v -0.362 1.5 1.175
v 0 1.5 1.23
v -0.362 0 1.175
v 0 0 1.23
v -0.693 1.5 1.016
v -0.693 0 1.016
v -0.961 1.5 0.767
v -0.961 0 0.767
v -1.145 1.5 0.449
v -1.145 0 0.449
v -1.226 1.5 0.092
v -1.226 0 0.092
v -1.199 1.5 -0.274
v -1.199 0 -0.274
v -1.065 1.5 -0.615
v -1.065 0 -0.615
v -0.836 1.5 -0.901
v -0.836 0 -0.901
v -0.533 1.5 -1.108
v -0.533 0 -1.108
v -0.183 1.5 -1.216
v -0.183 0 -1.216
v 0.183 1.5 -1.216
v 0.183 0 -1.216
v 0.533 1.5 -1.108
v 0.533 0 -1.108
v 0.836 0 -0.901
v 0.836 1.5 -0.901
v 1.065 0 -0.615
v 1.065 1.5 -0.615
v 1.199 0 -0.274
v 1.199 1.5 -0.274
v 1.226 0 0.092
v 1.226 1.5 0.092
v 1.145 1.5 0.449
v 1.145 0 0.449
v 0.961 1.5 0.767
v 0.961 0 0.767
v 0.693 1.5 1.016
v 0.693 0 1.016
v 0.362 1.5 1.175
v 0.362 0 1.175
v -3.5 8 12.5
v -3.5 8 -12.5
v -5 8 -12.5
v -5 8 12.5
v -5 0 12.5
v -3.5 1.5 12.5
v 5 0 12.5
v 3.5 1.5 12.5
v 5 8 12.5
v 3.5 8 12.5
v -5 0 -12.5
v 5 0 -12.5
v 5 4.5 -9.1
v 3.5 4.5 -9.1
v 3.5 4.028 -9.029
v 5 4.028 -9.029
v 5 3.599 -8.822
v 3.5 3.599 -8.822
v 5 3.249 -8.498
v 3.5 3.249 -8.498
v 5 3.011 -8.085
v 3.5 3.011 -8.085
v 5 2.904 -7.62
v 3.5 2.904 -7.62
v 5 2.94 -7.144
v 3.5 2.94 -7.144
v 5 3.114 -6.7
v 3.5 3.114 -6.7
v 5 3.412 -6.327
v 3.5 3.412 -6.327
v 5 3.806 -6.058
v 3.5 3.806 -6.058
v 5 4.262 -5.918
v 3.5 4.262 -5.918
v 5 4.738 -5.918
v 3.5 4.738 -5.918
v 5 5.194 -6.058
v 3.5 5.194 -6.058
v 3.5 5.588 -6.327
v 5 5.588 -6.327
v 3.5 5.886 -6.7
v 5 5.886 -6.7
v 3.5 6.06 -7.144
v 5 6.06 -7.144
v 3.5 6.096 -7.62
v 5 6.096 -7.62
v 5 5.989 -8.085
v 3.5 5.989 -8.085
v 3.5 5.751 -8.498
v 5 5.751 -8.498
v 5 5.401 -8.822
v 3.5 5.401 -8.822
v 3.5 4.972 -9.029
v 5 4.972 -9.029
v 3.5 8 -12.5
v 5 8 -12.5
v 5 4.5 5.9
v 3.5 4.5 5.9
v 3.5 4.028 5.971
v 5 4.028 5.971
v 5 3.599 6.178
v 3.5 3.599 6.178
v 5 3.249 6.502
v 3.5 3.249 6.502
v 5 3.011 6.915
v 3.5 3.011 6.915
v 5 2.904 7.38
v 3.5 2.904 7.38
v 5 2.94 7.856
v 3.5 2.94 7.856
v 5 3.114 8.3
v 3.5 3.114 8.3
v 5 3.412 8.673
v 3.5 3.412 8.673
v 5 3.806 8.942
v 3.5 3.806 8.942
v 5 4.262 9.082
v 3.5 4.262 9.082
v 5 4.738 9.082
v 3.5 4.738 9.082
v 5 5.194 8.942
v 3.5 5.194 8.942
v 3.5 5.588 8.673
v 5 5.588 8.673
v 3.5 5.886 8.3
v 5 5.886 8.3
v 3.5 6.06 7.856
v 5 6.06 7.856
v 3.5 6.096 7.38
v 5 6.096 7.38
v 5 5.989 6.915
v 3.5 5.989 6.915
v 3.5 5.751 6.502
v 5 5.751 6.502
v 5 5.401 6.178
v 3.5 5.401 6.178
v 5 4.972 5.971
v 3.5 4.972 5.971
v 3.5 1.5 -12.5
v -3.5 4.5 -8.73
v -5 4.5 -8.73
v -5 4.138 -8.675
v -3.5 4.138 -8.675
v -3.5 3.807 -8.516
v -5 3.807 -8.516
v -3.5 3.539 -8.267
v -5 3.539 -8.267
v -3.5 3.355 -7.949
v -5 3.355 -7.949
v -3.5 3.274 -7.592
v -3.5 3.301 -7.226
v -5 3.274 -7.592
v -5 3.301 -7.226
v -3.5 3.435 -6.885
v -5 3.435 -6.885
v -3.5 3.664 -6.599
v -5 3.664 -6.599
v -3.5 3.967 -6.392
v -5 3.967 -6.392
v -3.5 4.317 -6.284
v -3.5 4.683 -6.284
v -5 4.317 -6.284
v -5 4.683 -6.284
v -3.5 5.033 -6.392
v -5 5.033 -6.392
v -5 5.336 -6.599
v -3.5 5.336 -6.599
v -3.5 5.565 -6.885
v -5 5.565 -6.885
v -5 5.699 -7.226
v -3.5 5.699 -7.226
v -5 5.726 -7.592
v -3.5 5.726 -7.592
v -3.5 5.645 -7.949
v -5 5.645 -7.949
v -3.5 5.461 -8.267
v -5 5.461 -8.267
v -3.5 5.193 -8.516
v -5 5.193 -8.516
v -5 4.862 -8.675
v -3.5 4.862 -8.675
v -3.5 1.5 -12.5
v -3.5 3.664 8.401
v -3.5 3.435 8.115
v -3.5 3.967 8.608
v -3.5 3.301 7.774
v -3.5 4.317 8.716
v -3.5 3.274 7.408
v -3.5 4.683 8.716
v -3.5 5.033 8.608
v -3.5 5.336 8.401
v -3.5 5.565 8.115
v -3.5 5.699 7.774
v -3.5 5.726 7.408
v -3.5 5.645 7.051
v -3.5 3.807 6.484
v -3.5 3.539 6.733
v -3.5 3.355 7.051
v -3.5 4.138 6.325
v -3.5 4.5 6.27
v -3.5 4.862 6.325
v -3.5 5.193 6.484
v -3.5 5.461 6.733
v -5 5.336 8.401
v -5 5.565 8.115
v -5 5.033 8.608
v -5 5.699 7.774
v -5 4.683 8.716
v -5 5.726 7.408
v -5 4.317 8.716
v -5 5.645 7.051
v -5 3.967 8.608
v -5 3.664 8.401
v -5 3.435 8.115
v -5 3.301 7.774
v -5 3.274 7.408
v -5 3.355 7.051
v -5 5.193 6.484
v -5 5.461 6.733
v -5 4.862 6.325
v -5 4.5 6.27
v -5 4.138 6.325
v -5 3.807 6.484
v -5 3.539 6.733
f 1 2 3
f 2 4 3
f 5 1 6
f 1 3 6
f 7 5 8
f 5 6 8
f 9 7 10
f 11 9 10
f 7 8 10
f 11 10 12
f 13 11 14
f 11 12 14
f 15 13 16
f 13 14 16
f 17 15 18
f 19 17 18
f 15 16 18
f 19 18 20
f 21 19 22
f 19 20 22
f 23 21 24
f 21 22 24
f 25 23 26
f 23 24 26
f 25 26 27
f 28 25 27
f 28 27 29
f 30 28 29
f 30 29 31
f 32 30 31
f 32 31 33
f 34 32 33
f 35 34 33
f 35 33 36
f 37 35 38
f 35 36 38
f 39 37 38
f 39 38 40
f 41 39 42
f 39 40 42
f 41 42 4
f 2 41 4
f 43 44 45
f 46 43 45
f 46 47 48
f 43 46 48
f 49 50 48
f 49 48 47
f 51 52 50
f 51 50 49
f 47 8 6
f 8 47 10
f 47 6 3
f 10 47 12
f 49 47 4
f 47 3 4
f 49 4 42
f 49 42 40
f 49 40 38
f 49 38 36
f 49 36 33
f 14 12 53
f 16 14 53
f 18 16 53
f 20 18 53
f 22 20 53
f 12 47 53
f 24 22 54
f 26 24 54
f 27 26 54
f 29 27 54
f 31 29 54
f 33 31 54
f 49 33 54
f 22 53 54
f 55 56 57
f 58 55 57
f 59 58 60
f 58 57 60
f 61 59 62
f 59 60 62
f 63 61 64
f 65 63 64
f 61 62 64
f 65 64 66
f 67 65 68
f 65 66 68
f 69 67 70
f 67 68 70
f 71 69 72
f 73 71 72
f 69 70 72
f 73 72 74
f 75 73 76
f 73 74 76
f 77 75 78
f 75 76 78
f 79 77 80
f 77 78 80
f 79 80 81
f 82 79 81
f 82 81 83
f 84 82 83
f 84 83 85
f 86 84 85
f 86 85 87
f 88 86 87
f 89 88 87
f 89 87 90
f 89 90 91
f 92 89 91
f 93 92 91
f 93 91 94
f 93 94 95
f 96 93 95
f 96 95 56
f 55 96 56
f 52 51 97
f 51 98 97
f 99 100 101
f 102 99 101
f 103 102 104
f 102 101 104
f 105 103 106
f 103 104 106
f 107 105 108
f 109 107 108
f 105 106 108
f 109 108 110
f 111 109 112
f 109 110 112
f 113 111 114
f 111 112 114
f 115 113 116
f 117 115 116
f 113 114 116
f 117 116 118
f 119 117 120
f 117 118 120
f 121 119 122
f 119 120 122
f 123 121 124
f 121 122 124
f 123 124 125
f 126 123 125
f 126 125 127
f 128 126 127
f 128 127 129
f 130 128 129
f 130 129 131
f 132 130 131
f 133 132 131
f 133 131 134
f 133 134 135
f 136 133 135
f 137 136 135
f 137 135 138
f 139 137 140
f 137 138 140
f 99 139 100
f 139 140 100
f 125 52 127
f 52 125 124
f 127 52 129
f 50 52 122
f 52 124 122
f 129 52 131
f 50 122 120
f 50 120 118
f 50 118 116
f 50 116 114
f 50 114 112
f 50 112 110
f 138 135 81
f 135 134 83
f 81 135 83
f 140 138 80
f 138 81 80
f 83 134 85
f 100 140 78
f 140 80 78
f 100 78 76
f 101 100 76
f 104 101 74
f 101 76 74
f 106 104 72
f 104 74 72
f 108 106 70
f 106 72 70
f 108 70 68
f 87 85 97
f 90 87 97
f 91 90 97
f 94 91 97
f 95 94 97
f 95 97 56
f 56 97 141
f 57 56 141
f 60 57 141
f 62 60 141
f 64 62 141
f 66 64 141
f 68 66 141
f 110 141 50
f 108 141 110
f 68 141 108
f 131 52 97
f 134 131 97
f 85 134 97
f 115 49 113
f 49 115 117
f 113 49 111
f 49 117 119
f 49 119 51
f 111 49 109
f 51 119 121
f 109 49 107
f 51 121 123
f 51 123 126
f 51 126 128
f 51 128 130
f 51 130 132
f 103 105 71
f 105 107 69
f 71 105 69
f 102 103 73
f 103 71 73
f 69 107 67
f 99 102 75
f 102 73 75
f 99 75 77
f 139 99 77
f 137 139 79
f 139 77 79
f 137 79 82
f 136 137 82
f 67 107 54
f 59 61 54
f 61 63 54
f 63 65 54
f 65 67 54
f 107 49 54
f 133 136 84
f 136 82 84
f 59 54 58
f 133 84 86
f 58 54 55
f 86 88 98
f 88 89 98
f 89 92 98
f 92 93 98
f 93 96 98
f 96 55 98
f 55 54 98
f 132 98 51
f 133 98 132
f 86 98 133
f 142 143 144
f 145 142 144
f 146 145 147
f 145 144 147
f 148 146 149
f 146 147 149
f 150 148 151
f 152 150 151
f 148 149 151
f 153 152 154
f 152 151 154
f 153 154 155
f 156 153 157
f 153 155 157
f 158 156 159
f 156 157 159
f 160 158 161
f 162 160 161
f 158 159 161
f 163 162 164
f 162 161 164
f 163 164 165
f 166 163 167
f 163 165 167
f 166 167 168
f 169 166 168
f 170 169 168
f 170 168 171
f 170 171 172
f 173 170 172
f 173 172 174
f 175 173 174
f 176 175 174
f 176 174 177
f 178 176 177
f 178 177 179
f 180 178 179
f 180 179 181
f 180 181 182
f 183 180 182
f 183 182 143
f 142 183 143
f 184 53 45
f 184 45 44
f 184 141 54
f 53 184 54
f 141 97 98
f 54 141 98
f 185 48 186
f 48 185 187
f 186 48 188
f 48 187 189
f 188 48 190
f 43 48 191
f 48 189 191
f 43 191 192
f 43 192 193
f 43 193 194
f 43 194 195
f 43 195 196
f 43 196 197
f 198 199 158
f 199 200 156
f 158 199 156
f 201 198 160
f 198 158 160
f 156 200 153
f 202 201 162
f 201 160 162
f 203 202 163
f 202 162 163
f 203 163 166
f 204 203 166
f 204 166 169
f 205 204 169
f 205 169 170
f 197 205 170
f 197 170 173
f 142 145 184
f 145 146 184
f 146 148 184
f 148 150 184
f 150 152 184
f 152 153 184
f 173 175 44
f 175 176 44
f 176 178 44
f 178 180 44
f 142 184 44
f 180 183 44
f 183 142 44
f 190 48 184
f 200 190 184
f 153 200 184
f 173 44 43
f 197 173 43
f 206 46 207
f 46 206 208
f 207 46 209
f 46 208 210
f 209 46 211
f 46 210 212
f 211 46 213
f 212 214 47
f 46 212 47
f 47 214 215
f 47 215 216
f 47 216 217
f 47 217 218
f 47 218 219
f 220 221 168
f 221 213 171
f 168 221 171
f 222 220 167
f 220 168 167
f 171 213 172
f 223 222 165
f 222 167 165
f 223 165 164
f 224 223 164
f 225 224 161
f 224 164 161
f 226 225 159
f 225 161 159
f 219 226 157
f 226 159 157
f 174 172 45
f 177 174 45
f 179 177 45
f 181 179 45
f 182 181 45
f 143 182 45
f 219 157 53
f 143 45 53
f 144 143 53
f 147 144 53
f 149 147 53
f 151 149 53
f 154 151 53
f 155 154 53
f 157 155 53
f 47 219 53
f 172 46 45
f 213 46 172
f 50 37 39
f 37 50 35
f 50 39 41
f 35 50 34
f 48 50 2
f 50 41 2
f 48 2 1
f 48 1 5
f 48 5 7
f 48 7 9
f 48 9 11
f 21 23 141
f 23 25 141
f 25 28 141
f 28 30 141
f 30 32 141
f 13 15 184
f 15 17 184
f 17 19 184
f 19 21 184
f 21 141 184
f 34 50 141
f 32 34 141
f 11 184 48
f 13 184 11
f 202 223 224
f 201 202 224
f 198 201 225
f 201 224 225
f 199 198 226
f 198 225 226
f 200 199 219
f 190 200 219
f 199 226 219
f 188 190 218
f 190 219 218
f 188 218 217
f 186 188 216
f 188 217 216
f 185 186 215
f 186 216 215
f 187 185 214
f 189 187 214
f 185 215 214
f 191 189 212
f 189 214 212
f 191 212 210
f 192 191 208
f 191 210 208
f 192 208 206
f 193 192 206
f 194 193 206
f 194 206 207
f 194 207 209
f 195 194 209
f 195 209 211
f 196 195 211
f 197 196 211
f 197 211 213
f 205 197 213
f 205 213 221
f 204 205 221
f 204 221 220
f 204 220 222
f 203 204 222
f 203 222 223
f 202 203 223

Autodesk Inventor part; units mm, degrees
ref_plane "YZ Plane" through (0, 0, 0) normal (1, 0, 0) x (0, 1, 0)
ref_plane "XZ Plane" through (0, 0, 0) normal (0, 1, 0) x (-1, 0, 0)
ref_plane "XY Plane" through (0, 0, 0) normal (0, 0, 1) x (1, 0, 0)
sketch "Náčrt1" plane through (0, 0, 0) normal (0, 0, 1) x (1, 0, 0)
  line L0 (-5, 8) -> (-5, 0)
  line L1 (-5, 0) -> (5, 0)
  line L2 (5, 0) -> (5, 8)
  line L3 (5, 8) -> (3.5, 8)
  line L4 (3.5, 8) -> (3.5, 1.5)
  line L5 (3.5, 1.5) -> (-3.5, 1.5)
  line L6 (-3.5, 1.5) -> (-3.5, 8)
  line L7 (-3.5, 8) -> (-5, 8)
  line L8 (-7, 0) -> (7, 0) projected
  line L9 (0, 9.6) -> (0, -1.6) projected
  point P0 (0, 0)
  dimension "d0" = 8
  dimension "d1" = 10
  dimension "d2" = 1.5
  dimension "d3" = 1.5
  dimension "d4" = 1.5
extrude "Vysunutí1" add sketch "Náčrt1" along normal mid plane 25
sketch "Náčrt2" plane through (5, 0, 12.5) normal (1, 0, 0) x (0, 0, -1)
  line L0 (25, 8) -> (25, 0) projected
  line L1 (0, 0) -> (0, 8) projected
  line L2 (25, 8) -> (0, 8) projected
  point P0 (12.5, 0)
  point P1 (5, 4.5)
  point P2 (20, 4.5)
  dimension "d7" = 5
  dimension "d8" = 5
  dimension "d9" = 3.5
  dimension "d10" = 3.5
hole "Díra1" at (5, 4.5, 7.5) at (5, 4.5, -7.5) direction (-1, 0, 0) diameter 2.459 end through all counterbore diameter 3.2 counterbore depth 2 thread size "M3x0.5" class "6H" standard "ISO Metric profile"
sketch "Náčrt3" plane through (-3.5, 1.5, 12.5) normal (0, 1, 0) x (1, 0, 0)
  line L0 (0, 25) -> (0, 0) projected
  point P0 (3.5, 12.5)
  point P1 (3.5, 12.5)
hole "Díra2" at (0, 1.5, 0) direction (0, -1, 0) diameter 2.459 end through all thread size "M3x0.5" class "6H" standard "ISO Metric profile"
properties part number "x_belt_anchor" material "Hliník 6061"
